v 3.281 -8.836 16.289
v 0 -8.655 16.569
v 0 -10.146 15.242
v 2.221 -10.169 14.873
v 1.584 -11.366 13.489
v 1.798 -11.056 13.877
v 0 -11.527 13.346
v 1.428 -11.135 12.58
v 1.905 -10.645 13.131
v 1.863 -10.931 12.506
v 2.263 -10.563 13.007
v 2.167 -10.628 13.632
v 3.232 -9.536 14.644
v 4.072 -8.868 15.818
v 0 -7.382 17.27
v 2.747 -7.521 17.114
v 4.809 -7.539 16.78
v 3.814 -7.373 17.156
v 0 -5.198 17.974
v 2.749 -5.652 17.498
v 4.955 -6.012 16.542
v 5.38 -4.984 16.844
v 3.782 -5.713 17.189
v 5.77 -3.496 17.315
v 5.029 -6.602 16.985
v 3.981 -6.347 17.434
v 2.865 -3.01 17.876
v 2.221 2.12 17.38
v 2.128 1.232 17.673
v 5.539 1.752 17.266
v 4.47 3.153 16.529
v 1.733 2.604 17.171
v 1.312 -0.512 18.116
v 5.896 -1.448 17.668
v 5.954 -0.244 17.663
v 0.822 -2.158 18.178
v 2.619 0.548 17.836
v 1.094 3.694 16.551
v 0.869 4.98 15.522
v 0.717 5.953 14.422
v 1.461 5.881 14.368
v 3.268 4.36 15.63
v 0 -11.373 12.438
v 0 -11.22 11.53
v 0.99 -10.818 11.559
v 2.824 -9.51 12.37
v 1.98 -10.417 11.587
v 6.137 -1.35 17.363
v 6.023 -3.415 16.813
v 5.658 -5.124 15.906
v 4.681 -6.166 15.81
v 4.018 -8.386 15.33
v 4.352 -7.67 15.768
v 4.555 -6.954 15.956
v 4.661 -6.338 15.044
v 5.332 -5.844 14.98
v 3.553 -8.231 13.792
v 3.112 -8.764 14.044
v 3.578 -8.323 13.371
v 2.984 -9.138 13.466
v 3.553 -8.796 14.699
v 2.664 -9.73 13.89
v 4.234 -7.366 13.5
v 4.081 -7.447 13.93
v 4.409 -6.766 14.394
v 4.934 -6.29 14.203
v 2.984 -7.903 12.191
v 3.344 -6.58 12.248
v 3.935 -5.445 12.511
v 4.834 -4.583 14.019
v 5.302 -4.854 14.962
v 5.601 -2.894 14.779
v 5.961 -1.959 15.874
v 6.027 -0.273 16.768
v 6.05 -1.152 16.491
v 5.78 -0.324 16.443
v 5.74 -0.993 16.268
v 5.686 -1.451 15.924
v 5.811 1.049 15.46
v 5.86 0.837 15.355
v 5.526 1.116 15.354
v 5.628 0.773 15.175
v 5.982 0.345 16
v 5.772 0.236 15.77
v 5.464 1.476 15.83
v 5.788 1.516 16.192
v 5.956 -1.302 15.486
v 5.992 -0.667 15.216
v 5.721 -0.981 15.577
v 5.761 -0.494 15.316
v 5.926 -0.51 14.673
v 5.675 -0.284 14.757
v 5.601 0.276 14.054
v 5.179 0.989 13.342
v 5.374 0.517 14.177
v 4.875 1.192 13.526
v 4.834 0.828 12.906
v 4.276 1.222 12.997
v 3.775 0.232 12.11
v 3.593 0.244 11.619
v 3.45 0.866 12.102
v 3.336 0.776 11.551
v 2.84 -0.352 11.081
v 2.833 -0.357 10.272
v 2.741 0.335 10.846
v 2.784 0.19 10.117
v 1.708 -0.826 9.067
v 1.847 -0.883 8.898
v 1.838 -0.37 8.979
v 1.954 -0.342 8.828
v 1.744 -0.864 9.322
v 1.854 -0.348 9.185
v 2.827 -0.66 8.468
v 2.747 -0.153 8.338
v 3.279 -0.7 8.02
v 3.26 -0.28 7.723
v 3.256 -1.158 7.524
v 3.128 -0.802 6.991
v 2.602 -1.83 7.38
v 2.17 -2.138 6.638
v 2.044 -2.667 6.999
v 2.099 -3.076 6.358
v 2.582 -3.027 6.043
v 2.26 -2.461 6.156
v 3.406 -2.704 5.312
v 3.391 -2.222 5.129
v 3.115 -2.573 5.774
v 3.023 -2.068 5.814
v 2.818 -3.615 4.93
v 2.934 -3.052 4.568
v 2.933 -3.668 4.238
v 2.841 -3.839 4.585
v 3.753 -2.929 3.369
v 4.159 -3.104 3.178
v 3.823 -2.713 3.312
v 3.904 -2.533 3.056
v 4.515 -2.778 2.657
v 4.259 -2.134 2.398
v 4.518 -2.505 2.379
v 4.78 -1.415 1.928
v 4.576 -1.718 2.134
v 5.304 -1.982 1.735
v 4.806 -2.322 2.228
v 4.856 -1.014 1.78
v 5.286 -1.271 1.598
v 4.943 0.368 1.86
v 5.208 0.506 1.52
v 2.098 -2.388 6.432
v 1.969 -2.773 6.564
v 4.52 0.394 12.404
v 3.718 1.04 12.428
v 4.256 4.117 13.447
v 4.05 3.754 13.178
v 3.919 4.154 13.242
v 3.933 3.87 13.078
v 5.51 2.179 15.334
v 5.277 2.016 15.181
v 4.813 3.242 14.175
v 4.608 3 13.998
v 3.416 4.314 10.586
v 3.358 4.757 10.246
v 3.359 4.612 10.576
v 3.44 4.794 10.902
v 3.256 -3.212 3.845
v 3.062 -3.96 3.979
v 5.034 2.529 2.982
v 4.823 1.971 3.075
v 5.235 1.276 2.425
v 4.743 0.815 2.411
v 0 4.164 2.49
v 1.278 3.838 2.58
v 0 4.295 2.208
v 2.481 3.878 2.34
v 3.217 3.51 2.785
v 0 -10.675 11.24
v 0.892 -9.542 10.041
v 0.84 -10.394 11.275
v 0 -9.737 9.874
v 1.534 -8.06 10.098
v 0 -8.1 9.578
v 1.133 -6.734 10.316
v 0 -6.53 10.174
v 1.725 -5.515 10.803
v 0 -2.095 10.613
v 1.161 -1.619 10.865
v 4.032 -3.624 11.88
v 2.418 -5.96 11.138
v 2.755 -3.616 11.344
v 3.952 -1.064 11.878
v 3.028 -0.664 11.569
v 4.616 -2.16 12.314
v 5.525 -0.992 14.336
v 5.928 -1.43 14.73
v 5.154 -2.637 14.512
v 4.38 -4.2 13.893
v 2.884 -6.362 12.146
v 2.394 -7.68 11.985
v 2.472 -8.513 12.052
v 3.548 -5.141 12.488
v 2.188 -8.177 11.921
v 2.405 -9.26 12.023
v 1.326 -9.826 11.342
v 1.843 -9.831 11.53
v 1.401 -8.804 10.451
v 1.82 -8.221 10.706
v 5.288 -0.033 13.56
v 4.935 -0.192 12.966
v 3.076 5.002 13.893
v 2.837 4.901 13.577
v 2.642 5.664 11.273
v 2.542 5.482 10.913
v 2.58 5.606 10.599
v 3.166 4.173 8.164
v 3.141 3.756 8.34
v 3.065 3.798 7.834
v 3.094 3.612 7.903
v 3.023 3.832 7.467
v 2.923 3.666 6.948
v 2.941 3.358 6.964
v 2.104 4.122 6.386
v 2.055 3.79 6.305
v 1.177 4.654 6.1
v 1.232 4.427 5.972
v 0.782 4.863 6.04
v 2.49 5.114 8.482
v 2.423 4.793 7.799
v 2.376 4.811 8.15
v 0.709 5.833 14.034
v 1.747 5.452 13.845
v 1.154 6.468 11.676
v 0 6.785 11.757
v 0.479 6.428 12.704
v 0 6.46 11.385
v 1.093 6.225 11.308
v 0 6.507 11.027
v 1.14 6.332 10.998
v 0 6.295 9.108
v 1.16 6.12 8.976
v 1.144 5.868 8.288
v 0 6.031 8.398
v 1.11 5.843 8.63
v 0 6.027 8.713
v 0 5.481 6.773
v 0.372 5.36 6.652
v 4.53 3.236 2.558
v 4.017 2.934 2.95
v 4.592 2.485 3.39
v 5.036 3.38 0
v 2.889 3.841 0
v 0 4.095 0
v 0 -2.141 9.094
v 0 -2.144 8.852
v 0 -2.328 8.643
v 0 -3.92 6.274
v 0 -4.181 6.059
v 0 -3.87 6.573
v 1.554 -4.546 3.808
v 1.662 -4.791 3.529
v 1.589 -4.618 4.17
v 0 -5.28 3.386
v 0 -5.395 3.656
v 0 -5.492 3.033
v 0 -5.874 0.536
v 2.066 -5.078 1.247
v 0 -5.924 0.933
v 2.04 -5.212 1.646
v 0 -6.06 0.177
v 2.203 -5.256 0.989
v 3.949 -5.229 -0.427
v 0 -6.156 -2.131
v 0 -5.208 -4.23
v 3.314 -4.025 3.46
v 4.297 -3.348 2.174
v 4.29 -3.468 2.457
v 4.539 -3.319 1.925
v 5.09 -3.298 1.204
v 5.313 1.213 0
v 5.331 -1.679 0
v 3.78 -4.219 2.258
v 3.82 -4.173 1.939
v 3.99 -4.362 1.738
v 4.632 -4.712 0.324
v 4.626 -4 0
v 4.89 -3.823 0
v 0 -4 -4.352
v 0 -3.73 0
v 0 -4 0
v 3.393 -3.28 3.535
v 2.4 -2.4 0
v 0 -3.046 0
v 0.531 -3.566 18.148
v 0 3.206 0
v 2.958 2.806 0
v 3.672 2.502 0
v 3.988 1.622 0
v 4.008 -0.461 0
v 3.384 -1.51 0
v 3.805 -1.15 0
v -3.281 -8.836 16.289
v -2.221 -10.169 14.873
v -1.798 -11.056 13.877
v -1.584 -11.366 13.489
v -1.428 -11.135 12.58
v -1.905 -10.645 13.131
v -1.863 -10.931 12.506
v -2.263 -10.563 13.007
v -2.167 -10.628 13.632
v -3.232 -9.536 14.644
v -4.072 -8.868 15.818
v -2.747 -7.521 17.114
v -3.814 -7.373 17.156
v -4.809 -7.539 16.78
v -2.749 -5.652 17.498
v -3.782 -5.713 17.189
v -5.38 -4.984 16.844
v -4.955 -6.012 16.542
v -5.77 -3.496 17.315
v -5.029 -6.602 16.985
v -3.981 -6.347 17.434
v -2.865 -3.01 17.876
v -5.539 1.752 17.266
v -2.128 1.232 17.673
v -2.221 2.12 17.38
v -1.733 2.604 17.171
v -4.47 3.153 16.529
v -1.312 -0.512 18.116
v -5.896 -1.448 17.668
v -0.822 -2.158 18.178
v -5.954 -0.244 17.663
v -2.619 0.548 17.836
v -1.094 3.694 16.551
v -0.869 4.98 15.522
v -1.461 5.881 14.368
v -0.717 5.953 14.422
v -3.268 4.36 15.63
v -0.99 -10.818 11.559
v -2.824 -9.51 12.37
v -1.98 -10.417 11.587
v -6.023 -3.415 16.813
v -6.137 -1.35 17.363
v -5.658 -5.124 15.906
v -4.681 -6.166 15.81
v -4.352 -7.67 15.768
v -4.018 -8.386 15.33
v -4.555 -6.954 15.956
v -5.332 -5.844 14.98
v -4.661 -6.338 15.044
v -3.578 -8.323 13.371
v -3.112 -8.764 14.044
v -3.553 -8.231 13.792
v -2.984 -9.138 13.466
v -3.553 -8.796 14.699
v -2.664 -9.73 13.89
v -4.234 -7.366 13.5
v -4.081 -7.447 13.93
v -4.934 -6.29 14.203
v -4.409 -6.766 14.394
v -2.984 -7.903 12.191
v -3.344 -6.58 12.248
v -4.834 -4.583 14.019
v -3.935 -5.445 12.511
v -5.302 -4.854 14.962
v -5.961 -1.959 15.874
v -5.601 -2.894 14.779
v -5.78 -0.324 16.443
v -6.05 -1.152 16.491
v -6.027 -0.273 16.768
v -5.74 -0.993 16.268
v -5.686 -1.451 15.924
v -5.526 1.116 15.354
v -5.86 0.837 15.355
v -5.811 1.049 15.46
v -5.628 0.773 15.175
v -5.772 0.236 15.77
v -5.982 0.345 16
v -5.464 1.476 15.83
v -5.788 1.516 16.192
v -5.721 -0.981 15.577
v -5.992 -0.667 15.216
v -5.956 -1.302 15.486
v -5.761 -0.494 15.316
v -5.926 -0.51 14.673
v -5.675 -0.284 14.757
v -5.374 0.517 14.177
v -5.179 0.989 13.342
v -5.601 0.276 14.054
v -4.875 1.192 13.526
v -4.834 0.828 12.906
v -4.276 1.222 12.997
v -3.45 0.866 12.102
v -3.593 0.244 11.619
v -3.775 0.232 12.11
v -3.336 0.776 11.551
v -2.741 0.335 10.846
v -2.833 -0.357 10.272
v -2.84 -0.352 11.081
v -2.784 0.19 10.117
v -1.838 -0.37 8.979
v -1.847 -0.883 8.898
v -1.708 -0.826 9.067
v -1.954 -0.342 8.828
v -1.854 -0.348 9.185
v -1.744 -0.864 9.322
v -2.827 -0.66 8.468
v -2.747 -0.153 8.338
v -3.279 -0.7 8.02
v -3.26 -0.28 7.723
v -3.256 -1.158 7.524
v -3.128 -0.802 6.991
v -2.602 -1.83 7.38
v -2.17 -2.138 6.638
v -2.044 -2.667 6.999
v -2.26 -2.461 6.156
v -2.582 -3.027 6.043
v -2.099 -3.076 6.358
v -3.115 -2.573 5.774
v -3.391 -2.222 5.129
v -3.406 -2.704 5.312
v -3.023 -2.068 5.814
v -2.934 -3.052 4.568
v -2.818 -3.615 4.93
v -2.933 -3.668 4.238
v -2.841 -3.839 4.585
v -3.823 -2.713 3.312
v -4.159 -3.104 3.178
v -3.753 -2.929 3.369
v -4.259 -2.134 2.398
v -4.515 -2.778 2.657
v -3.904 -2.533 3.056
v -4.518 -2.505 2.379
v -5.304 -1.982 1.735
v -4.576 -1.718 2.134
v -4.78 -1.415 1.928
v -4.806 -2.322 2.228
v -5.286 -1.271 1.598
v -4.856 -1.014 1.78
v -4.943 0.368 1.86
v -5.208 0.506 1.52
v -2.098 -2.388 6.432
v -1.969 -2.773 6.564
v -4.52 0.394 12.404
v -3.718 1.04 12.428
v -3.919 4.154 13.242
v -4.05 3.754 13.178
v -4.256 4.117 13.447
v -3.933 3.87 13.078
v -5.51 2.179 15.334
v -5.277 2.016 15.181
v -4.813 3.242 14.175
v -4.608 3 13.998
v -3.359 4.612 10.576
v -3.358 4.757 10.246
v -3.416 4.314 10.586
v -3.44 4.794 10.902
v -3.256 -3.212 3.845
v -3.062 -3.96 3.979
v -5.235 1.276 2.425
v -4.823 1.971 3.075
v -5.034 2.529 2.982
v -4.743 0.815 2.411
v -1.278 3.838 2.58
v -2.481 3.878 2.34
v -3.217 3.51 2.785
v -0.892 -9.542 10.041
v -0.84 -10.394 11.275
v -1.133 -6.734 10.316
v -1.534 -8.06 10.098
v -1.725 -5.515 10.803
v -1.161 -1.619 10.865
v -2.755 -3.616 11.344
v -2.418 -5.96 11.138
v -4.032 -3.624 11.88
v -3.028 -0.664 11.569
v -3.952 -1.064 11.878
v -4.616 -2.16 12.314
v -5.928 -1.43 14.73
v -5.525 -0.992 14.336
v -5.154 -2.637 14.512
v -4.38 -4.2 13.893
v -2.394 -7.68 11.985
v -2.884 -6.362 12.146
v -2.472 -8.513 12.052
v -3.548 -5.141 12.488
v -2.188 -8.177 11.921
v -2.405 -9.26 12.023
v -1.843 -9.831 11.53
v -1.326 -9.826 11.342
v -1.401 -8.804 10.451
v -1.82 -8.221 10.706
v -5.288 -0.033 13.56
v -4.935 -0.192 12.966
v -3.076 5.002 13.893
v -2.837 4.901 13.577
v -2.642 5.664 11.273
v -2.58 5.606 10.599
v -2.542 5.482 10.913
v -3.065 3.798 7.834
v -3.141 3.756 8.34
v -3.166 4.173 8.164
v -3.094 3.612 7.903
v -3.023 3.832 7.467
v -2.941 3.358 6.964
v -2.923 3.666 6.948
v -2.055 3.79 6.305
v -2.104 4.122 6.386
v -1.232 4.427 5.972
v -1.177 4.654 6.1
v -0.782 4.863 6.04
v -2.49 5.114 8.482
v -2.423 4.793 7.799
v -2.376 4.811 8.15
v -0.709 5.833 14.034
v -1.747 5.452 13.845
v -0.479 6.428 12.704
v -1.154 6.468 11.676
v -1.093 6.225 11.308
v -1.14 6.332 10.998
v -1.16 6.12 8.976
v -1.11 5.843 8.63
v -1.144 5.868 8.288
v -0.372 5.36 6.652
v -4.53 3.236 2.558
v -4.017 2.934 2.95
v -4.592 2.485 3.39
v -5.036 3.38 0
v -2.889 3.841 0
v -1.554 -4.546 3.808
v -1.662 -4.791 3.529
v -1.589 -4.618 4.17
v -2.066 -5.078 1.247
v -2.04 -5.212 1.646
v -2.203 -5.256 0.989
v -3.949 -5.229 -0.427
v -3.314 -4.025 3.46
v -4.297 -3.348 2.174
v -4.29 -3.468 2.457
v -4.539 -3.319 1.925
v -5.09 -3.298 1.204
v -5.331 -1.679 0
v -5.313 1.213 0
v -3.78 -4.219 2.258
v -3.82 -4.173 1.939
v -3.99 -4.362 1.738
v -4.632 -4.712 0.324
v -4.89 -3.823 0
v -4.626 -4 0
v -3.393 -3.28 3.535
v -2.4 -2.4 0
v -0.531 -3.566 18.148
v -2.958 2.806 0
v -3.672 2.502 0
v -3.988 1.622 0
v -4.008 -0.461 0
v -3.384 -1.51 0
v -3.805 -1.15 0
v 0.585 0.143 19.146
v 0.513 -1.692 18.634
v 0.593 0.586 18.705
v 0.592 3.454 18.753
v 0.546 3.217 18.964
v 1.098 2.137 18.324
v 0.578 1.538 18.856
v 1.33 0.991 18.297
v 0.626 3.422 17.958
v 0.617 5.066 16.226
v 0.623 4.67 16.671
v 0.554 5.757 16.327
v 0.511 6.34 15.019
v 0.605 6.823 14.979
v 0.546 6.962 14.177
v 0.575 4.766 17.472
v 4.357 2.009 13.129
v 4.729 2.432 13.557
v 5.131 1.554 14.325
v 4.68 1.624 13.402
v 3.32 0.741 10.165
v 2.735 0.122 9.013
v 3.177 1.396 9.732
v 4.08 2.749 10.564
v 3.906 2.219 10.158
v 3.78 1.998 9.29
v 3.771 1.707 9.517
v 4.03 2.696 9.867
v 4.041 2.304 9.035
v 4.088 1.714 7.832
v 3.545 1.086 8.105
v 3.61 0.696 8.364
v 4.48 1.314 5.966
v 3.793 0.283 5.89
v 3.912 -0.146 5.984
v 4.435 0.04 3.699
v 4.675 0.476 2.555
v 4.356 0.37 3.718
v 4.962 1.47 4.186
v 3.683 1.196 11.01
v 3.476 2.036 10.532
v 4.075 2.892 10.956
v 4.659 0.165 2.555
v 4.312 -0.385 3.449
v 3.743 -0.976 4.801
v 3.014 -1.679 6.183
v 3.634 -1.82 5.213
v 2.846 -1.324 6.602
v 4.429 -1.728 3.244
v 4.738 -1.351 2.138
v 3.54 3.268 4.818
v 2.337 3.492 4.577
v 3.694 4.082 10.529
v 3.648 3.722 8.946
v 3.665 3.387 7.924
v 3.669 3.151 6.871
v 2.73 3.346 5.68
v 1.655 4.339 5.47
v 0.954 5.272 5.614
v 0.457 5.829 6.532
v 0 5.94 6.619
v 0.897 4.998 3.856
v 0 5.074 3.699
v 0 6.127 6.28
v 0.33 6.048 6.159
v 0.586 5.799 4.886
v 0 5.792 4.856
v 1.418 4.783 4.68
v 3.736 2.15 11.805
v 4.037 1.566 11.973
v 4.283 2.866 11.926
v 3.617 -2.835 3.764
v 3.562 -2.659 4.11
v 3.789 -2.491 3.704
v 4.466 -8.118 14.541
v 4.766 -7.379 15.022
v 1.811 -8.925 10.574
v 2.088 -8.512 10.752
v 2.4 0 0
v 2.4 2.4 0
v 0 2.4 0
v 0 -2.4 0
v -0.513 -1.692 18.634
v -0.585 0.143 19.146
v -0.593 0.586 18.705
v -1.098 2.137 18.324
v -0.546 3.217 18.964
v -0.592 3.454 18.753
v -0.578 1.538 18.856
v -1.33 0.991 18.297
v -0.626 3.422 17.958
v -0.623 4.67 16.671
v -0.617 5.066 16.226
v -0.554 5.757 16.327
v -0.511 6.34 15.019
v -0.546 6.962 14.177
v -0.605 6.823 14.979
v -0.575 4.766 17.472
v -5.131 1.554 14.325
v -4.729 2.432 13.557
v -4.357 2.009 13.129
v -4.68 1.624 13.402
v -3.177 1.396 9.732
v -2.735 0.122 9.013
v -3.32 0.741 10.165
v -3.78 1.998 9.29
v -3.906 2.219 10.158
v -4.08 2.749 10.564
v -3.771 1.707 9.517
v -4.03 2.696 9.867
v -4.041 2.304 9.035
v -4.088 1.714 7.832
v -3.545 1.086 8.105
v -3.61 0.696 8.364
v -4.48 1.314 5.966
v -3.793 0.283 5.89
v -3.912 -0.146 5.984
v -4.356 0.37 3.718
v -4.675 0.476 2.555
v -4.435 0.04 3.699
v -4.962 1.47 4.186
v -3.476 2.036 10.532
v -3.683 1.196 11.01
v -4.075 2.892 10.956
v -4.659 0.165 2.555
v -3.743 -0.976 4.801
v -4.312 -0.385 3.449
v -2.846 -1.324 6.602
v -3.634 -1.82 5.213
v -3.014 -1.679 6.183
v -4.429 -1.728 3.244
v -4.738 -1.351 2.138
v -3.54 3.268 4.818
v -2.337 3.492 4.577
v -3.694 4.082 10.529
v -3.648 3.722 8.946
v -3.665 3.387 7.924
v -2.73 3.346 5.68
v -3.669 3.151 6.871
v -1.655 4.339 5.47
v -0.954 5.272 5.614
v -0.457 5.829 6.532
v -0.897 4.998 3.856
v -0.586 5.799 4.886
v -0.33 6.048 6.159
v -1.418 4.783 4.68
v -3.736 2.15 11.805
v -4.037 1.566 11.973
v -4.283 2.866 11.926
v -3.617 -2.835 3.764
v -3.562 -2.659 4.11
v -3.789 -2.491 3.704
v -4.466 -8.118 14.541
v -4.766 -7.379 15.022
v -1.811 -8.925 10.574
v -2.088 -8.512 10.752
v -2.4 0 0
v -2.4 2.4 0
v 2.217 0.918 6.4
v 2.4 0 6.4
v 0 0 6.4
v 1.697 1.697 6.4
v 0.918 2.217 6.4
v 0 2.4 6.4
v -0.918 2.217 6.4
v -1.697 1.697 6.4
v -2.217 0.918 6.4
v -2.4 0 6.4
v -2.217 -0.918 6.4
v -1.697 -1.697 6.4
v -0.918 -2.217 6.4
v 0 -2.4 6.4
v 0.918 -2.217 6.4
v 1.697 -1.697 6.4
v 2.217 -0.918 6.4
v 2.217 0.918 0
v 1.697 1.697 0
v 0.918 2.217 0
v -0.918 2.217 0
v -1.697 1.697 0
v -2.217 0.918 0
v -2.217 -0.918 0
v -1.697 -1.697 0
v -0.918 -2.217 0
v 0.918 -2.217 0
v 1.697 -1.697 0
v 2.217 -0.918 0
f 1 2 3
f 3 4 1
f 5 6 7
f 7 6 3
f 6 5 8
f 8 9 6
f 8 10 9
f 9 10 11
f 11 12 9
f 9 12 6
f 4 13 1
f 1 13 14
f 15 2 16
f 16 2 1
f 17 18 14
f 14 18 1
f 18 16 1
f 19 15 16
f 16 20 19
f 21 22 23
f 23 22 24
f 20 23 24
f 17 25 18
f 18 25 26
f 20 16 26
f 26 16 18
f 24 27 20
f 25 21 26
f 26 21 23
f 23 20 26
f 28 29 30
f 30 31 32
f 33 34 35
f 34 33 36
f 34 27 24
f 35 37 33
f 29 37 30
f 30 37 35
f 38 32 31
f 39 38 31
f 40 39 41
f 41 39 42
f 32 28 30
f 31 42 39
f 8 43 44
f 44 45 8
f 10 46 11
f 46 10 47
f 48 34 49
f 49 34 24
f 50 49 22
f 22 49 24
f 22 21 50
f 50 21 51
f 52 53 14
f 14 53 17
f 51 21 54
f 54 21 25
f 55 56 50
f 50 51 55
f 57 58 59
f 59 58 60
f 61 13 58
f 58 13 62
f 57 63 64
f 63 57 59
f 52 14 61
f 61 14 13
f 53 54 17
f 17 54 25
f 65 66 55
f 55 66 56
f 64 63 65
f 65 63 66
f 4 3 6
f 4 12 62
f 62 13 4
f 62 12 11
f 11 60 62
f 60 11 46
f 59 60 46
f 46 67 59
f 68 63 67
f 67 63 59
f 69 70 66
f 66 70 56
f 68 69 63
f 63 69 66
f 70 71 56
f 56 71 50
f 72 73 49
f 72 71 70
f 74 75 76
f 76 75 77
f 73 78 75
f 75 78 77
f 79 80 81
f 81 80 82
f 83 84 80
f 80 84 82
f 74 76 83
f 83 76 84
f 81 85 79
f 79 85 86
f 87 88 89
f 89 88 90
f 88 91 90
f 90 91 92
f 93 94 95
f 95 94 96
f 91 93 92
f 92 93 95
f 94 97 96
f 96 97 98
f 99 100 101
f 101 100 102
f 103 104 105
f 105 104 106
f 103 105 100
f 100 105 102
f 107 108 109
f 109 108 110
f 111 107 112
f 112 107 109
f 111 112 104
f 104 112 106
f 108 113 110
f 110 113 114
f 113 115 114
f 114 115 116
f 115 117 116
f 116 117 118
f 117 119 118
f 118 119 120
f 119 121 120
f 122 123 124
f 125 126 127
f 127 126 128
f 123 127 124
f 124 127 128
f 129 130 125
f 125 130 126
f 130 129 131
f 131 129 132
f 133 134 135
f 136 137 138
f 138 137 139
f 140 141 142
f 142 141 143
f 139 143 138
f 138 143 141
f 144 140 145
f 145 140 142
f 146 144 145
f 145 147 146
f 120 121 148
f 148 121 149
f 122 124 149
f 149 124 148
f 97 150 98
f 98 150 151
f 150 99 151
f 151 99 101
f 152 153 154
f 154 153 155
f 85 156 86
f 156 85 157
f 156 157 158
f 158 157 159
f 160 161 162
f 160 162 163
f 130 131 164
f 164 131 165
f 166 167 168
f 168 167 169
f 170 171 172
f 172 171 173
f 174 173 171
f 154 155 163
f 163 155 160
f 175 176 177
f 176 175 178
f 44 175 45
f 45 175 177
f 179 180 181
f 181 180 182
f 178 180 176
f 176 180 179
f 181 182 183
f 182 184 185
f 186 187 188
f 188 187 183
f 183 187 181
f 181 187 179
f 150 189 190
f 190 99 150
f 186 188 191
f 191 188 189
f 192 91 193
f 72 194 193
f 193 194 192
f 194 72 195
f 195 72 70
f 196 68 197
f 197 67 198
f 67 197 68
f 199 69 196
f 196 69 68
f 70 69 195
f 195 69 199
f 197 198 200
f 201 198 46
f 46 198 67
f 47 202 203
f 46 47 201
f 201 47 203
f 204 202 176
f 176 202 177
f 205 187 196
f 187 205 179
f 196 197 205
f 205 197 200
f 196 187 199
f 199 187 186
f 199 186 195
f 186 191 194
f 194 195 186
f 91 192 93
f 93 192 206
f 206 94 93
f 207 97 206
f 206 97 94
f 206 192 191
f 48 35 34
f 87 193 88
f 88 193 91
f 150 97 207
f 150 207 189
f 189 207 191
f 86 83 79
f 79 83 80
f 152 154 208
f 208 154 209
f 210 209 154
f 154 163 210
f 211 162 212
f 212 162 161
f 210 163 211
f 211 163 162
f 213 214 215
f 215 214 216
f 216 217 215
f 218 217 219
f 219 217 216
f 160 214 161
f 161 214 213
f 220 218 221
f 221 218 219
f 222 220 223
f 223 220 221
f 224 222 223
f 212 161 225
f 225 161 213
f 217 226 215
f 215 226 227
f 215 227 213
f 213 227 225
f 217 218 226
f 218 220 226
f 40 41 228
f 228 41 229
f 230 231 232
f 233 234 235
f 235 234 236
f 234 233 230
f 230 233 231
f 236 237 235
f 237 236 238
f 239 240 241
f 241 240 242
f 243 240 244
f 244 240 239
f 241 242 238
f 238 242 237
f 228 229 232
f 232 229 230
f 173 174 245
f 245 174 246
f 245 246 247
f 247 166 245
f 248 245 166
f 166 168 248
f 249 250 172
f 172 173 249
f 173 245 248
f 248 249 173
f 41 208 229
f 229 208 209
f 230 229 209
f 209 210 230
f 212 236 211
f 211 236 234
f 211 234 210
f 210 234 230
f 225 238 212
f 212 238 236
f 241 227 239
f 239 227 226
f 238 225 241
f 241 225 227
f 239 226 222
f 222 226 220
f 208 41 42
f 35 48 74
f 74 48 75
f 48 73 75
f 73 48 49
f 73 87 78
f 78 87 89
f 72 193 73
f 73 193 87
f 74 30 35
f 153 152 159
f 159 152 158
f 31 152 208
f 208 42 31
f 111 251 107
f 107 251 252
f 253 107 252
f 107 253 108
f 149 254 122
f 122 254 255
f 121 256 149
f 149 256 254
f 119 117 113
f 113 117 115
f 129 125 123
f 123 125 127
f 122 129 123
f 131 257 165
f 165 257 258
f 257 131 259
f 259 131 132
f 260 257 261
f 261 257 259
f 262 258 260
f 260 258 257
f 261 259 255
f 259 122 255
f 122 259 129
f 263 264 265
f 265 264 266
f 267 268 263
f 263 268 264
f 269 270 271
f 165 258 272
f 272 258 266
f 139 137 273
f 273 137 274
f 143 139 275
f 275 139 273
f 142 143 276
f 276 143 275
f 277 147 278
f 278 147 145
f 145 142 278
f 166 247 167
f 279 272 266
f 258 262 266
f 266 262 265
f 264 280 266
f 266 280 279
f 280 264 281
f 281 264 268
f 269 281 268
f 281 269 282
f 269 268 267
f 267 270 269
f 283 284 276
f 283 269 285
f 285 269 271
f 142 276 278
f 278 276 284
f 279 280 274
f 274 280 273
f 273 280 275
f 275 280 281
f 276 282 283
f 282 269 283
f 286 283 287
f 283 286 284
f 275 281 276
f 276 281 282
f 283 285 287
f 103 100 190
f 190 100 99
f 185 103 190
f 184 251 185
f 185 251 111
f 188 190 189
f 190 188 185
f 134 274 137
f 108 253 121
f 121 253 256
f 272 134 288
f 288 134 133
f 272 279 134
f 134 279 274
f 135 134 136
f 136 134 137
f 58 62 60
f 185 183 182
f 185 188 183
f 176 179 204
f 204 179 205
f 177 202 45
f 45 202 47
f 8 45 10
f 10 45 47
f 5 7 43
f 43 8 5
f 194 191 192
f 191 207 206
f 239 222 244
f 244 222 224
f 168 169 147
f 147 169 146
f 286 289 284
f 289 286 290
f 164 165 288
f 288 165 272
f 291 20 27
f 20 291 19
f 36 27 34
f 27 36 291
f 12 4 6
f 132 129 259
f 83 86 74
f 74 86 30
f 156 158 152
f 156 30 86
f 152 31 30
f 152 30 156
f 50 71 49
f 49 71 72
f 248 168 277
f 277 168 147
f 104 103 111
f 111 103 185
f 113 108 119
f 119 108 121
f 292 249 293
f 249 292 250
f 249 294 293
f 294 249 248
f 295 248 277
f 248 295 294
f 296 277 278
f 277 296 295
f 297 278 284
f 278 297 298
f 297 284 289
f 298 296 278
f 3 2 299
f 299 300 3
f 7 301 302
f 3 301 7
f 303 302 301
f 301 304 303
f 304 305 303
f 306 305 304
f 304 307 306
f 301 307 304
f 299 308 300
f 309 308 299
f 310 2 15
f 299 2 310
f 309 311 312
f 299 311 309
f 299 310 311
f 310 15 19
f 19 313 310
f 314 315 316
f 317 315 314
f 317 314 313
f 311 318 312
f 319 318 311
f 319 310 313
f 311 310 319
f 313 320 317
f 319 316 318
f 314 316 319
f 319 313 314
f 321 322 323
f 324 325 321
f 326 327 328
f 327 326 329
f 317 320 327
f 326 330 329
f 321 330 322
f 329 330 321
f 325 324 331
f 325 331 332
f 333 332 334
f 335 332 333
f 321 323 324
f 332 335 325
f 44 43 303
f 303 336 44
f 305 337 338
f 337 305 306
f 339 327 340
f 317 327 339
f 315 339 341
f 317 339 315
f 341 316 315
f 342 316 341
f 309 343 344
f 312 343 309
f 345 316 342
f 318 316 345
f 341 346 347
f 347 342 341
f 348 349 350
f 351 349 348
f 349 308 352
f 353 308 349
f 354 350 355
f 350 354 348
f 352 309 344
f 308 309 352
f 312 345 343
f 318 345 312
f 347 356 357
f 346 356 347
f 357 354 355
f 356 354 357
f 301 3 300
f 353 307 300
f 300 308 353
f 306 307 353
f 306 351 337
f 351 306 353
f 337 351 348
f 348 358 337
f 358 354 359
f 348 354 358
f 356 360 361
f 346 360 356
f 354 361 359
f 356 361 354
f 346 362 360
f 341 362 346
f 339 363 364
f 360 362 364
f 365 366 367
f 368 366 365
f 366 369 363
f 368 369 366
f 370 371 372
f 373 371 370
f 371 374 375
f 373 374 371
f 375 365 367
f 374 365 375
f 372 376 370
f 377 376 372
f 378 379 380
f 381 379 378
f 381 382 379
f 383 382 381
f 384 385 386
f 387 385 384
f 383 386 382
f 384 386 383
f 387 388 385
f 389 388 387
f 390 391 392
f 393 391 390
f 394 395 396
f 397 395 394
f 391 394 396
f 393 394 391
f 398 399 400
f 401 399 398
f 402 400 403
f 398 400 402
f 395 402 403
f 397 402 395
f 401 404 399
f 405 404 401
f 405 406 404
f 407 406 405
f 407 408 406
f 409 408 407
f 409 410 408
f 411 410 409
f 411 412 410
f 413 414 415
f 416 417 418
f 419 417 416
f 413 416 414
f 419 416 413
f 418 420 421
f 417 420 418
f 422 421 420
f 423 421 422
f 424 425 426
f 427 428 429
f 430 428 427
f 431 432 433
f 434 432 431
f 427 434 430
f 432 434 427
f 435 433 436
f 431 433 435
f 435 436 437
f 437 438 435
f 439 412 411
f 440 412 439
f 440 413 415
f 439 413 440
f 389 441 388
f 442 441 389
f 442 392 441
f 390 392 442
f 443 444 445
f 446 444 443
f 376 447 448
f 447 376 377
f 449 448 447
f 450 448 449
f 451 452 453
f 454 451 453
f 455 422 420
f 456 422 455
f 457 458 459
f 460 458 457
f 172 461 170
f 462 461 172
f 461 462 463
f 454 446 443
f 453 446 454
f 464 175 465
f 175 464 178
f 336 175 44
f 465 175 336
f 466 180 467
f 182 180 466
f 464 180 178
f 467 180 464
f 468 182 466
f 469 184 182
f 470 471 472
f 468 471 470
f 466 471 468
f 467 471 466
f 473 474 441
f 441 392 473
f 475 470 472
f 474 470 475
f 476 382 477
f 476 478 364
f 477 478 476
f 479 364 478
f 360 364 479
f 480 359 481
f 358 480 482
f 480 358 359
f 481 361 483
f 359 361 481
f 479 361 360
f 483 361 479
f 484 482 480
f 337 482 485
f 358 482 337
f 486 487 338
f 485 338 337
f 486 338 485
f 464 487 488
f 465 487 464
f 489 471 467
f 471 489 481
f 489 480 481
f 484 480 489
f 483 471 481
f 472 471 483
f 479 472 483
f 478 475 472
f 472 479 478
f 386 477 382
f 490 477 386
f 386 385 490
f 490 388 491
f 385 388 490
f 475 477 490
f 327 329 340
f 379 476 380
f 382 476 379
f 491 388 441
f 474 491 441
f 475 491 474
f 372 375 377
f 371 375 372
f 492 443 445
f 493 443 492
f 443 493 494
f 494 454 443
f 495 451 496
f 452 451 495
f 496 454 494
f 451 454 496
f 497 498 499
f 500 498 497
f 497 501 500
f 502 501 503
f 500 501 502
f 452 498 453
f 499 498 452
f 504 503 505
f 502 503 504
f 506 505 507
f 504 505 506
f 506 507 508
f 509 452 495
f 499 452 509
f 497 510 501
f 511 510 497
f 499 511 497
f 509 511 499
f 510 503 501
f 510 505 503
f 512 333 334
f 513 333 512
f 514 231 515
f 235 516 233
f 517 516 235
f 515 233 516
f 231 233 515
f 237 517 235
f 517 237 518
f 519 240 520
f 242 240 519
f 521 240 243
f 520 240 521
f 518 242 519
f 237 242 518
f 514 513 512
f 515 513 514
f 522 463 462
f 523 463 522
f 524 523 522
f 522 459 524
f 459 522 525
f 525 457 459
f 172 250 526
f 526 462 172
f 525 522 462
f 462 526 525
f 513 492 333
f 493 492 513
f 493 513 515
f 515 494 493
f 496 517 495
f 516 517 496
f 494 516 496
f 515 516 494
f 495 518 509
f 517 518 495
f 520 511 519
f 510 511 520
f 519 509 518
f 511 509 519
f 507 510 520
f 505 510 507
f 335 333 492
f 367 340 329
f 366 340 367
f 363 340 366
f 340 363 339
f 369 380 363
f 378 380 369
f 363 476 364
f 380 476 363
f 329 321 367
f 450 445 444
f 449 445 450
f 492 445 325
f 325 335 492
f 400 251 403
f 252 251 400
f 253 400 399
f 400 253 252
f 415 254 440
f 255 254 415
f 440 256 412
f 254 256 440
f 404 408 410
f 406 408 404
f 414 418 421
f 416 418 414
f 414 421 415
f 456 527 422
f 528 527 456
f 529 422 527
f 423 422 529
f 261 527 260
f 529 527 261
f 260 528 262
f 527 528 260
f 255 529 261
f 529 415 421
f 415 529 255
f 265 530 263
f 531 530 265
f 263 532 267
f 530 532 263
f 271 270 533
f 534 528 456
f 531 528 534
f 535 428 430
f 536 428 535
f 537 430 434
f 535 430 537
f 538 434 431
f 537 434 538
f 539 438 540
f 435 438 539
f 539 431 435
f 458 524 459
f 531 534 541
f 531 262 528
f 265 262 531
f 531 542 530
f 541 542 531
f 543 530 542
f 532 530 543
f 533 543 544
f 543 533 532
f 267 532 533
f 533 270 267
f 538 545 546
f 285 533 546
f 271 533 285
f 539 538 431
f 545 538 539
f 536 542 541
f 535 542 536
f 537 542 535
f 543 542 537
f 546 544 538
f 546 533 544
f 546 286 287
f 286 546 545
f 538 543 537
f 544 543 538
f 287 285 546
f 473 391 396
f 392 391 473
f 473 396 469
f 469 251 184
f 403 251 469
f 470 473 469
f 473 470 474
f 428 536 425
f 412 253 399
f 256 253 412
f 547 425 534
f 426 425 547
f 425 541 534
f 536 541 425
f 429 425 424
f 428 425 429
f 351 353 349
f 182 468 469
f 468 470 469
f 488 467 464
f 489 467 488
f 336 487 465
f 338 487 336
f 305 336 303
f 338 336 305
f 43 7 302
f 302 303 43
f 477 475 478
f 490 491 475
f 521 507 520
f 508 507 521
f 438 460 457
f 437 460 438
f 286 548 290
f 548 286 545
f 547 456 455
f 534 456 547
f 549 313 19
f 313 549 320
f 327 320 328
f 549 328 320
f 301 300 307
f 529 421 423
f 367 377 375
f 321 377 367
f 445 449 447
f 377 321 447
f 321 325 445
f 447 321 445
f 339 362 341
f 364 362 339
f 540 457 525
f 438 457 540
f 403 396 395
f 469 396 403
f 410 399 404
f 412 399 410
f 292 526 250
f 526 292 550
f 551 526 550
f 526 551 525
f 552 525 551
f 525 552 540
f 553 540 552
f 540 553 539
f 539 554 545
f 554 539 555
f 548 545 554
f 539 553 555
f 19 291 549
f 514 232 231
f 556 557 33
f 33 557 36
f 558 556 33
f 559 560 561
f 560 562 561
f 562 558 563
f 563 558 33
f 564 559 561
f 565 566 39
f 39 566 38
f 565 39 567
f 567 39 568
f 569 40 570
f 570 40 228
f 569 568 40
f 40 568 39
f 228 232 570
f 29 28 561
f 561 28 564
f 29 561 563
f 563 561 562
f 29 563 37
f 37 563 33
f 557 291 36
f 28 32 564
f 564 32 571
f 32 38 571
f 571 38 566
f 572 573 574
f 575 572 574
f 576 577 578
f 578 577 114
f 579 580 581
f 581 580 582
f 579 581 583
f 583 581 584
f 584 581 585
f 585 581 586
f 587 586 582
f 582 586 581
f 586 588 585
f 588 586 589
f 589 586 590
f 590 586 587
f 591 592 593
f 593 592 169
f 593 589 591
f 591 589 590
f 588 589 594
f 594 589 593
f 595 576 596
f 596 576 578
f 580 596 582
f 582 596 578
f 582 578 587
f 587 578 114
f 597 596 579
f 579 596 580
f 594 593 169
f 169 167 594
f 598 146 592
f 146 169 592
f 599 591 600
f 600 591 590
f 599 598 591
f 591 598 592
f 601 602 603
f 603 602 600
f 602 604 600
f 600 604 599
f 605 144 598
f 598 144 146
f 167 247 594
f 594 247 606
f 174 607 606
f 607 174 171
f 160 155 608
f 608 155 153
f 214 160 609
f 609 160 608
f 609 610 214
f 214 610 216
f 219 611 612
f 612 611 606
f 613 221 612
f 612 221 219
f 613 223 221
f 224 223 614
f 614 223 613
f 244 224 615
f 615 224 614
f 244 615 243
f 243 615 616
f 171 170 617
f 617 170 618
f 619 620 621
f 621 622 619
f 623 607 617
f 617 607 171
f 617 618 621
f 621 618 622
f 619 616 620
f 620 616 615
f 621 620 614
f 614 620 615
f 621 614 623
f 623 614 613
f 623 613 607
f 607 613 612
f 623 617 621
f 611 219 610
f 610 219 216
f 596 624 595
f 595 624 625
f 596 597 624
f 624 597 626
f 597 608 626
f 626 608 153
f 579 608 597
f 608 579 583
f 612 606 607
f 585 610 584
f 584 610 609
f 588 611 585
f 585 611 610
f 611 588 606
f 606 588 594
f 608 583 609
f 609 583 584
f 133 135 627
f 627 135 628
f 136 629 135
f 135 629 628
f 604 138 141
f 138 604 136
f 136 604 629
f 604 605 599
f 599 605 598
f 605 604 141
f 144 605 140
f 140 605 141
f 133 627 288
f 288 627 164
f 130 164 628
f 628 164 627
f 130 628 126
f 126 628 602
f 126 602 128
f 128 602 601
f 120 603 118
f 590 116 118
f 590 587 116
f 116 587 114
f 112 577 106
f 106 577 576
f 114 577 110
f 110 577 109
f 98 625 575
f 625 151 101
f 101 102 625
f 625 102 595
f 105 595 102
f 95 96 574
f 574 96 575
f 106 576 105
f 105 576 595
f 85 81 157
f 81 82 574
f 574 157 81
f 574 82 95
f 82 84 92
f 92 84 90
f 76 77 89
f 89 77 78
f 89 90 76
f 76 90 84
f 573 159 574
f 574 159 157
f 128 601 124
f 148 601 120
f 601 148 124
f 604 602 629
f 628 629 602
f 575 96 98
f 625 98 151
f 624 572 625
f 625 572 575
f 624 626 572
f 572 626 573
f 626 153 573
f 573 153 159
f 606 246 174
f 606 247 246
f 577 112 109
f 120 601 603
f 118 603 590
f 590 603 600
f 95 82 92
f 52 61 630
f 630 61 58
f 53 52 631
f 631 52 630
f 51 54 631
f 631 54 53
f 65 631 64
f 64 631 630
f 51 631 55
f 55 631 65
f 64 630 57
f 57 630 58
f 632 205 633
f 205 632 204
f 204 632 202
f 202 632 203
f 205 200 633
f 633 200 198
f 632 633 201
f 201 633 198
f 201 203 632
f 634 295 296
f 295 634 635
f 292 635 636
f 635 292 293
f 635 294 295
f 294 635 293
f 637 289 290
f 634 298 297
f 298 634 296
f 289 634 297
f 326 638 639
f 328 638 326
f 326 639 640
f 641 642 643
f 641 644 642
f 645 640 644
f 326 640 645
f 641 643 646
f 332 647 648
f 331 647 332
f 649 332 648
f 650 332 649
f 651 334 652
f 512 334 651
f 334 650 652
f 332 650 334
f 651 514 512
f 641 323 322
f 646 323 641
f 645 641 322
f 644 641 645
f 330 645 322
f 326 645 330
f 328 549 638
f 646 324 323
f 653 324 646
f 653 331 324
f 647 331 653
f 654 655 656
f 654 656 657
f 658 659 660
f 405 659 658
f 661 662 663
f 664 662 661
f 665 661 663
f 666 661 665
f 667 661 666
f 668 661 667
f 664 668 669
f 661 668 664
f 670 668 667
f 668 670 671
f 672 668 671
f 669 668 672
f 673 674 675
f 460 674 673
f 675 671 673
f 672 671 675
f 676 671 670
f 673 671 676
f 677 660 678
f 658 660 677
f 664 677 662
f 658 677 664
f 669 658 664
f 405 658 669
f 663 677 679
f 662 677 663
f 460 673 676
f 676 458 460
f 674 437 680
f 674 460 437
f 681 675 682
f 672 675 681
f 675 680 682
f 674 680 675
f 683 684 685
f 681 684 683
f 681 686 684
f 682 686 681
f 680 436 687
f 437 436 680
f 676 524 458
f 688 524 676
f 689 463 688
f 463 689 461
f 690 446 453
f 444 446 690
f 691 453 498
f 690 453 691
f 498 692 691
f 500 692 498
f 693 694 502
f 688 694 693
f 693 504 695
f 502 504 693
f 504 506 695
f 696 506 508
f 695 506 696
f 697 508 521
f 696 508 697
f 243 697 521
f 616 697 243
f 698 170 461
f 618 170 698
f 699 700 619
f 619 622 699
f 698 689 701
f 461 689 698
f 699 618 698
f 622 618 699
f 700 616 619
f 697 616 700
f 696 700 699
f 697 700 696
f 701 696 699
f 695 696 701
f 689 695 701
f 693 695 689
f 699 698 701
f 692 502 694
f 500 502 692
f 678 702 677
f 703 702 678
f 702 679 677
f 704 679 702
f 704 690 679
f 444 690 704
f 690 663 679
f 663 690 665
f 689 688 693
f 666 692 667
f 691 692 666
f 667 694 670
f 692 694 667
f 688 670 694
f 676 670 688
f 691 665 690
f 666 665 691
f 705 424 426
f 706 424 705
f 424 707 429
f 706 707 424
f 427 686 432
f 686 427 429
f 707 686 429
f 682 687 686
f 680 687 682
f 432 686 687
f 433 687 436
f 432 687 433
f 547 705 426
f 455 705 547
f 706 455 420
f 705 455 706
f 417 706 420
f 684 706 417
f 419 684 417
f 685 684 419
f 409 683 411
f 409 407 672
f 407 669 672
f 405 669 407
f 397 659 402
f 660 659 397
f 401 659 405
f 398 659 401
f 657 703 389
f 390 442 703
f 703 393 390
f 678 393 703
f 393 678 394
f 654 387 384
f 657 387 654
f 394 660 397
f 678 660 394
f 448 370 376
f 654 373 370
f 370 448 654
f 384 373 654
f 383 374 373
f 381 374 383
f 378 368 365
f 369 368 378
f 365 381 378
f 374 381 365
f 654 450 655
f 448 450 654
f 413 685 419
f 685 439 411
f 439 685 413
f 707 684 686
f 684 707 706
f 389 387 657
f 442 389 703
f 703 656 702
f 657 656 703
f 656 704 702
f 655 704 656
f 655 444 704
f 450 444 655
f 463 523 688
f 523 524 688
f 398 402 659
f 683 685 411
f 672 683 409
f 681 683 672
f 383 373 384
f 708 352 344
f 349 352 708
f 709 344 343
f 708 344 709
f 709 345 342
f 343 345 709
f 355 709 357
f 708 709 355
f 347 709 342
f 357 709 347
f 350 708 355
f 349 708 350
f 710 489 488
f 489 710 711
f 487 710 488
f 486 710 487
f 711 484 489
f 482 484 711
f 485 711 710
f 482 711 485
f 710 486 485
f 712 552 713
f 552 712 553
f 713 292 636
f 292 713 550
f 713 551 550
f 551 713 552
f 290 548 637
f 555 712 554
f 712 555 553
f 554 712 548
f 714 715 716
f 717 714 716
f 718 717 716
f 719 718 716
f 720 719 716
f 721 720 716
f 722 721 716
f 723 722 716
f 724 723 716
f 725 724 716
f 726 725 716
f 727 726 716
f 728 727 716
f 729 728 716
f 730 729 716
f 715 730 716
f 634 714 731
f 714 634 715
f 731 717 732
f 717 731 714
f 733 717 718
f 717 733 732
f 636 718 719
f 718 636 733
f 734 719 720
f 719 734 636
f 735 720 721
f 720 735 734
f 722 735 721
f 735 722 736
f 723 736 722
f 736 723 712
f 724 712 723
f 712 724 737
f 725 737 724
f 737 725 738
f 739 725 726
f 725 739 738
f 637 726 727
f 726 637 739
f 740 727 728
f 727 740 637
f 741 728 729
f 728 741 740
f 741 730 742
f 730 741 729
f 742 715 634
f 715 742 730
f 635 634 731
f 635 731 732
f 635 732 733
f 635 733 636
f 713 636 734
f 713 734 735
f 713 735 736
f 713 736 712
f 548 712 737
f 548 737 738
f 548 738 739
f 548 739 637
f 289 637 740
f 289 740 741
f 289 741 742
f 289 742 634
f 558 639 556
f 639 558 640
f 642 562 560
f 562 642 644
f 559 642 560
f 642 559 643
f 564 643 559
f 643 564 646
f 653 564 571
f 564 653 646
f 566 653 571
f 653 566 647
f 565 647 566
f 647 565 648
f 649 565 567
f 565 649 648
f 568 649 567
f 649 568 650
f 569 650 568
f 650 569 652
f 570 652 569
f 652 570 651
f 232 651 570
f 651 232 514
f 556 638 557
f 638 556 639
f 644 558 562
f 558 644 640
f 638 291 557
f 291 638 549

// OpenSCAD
use <../lib.scad>
use <s/49588s01.scad>
use <s/49588s03.scad>
function ldraw_lib__49588p04() = [
// 0 Minifig Head Snake with Closed Mouth with Pearl Dark Grey Flames and Eyes Pattern
// 0 Name: 49588p04.dat
// 0 Author: Philippe Hurbain [Philo]
// 0 !LDRAW_ORG Part UPDATE 2023-04
// 0 !LICENSE Licensed under CC BY 4.0 : see CAreadme.txt
// 
// 0 BFC CERTIFY CCW
  [0,"BFC","CERTIFY"],
  [0,"BFC","CCW"],
// 
// 0 !KEYWORDS Bricklink 49588pb04, Ninjago, Rebrickable 49588pat0003, Set 71760
// 
// 0 !HISTORY 2023-08-25 [OrionP] Official Update 2023-04
// 
// 
// 1 16 0 0 0 1 0 0 0 1 0 0 0 1 s\49588s01.dat
  [1,16,0,0,0,1,0,0,0,1,0,0,0,1, ldraw_lib__s__49588s01()],
// 1 148 0 0 0 1 0 0 0 1 0 0 0 1 s\49588s03.dat
  [1,148,0,0,0,1,0,0,0,1,0,0,0,1, ldraw_lib__s__49588s03()],
];
module ldraw_lib__49588p04(step=0, col=false, unit=2/5, alt=false, line=0.2, solid=!$preview)
    makepoly(ldraw_lib__49588p04(), step=step, col=col, unit=unit, alt=alt, line=line, solid=solid);
ldraw_lib__49588p04(line=0.2);
